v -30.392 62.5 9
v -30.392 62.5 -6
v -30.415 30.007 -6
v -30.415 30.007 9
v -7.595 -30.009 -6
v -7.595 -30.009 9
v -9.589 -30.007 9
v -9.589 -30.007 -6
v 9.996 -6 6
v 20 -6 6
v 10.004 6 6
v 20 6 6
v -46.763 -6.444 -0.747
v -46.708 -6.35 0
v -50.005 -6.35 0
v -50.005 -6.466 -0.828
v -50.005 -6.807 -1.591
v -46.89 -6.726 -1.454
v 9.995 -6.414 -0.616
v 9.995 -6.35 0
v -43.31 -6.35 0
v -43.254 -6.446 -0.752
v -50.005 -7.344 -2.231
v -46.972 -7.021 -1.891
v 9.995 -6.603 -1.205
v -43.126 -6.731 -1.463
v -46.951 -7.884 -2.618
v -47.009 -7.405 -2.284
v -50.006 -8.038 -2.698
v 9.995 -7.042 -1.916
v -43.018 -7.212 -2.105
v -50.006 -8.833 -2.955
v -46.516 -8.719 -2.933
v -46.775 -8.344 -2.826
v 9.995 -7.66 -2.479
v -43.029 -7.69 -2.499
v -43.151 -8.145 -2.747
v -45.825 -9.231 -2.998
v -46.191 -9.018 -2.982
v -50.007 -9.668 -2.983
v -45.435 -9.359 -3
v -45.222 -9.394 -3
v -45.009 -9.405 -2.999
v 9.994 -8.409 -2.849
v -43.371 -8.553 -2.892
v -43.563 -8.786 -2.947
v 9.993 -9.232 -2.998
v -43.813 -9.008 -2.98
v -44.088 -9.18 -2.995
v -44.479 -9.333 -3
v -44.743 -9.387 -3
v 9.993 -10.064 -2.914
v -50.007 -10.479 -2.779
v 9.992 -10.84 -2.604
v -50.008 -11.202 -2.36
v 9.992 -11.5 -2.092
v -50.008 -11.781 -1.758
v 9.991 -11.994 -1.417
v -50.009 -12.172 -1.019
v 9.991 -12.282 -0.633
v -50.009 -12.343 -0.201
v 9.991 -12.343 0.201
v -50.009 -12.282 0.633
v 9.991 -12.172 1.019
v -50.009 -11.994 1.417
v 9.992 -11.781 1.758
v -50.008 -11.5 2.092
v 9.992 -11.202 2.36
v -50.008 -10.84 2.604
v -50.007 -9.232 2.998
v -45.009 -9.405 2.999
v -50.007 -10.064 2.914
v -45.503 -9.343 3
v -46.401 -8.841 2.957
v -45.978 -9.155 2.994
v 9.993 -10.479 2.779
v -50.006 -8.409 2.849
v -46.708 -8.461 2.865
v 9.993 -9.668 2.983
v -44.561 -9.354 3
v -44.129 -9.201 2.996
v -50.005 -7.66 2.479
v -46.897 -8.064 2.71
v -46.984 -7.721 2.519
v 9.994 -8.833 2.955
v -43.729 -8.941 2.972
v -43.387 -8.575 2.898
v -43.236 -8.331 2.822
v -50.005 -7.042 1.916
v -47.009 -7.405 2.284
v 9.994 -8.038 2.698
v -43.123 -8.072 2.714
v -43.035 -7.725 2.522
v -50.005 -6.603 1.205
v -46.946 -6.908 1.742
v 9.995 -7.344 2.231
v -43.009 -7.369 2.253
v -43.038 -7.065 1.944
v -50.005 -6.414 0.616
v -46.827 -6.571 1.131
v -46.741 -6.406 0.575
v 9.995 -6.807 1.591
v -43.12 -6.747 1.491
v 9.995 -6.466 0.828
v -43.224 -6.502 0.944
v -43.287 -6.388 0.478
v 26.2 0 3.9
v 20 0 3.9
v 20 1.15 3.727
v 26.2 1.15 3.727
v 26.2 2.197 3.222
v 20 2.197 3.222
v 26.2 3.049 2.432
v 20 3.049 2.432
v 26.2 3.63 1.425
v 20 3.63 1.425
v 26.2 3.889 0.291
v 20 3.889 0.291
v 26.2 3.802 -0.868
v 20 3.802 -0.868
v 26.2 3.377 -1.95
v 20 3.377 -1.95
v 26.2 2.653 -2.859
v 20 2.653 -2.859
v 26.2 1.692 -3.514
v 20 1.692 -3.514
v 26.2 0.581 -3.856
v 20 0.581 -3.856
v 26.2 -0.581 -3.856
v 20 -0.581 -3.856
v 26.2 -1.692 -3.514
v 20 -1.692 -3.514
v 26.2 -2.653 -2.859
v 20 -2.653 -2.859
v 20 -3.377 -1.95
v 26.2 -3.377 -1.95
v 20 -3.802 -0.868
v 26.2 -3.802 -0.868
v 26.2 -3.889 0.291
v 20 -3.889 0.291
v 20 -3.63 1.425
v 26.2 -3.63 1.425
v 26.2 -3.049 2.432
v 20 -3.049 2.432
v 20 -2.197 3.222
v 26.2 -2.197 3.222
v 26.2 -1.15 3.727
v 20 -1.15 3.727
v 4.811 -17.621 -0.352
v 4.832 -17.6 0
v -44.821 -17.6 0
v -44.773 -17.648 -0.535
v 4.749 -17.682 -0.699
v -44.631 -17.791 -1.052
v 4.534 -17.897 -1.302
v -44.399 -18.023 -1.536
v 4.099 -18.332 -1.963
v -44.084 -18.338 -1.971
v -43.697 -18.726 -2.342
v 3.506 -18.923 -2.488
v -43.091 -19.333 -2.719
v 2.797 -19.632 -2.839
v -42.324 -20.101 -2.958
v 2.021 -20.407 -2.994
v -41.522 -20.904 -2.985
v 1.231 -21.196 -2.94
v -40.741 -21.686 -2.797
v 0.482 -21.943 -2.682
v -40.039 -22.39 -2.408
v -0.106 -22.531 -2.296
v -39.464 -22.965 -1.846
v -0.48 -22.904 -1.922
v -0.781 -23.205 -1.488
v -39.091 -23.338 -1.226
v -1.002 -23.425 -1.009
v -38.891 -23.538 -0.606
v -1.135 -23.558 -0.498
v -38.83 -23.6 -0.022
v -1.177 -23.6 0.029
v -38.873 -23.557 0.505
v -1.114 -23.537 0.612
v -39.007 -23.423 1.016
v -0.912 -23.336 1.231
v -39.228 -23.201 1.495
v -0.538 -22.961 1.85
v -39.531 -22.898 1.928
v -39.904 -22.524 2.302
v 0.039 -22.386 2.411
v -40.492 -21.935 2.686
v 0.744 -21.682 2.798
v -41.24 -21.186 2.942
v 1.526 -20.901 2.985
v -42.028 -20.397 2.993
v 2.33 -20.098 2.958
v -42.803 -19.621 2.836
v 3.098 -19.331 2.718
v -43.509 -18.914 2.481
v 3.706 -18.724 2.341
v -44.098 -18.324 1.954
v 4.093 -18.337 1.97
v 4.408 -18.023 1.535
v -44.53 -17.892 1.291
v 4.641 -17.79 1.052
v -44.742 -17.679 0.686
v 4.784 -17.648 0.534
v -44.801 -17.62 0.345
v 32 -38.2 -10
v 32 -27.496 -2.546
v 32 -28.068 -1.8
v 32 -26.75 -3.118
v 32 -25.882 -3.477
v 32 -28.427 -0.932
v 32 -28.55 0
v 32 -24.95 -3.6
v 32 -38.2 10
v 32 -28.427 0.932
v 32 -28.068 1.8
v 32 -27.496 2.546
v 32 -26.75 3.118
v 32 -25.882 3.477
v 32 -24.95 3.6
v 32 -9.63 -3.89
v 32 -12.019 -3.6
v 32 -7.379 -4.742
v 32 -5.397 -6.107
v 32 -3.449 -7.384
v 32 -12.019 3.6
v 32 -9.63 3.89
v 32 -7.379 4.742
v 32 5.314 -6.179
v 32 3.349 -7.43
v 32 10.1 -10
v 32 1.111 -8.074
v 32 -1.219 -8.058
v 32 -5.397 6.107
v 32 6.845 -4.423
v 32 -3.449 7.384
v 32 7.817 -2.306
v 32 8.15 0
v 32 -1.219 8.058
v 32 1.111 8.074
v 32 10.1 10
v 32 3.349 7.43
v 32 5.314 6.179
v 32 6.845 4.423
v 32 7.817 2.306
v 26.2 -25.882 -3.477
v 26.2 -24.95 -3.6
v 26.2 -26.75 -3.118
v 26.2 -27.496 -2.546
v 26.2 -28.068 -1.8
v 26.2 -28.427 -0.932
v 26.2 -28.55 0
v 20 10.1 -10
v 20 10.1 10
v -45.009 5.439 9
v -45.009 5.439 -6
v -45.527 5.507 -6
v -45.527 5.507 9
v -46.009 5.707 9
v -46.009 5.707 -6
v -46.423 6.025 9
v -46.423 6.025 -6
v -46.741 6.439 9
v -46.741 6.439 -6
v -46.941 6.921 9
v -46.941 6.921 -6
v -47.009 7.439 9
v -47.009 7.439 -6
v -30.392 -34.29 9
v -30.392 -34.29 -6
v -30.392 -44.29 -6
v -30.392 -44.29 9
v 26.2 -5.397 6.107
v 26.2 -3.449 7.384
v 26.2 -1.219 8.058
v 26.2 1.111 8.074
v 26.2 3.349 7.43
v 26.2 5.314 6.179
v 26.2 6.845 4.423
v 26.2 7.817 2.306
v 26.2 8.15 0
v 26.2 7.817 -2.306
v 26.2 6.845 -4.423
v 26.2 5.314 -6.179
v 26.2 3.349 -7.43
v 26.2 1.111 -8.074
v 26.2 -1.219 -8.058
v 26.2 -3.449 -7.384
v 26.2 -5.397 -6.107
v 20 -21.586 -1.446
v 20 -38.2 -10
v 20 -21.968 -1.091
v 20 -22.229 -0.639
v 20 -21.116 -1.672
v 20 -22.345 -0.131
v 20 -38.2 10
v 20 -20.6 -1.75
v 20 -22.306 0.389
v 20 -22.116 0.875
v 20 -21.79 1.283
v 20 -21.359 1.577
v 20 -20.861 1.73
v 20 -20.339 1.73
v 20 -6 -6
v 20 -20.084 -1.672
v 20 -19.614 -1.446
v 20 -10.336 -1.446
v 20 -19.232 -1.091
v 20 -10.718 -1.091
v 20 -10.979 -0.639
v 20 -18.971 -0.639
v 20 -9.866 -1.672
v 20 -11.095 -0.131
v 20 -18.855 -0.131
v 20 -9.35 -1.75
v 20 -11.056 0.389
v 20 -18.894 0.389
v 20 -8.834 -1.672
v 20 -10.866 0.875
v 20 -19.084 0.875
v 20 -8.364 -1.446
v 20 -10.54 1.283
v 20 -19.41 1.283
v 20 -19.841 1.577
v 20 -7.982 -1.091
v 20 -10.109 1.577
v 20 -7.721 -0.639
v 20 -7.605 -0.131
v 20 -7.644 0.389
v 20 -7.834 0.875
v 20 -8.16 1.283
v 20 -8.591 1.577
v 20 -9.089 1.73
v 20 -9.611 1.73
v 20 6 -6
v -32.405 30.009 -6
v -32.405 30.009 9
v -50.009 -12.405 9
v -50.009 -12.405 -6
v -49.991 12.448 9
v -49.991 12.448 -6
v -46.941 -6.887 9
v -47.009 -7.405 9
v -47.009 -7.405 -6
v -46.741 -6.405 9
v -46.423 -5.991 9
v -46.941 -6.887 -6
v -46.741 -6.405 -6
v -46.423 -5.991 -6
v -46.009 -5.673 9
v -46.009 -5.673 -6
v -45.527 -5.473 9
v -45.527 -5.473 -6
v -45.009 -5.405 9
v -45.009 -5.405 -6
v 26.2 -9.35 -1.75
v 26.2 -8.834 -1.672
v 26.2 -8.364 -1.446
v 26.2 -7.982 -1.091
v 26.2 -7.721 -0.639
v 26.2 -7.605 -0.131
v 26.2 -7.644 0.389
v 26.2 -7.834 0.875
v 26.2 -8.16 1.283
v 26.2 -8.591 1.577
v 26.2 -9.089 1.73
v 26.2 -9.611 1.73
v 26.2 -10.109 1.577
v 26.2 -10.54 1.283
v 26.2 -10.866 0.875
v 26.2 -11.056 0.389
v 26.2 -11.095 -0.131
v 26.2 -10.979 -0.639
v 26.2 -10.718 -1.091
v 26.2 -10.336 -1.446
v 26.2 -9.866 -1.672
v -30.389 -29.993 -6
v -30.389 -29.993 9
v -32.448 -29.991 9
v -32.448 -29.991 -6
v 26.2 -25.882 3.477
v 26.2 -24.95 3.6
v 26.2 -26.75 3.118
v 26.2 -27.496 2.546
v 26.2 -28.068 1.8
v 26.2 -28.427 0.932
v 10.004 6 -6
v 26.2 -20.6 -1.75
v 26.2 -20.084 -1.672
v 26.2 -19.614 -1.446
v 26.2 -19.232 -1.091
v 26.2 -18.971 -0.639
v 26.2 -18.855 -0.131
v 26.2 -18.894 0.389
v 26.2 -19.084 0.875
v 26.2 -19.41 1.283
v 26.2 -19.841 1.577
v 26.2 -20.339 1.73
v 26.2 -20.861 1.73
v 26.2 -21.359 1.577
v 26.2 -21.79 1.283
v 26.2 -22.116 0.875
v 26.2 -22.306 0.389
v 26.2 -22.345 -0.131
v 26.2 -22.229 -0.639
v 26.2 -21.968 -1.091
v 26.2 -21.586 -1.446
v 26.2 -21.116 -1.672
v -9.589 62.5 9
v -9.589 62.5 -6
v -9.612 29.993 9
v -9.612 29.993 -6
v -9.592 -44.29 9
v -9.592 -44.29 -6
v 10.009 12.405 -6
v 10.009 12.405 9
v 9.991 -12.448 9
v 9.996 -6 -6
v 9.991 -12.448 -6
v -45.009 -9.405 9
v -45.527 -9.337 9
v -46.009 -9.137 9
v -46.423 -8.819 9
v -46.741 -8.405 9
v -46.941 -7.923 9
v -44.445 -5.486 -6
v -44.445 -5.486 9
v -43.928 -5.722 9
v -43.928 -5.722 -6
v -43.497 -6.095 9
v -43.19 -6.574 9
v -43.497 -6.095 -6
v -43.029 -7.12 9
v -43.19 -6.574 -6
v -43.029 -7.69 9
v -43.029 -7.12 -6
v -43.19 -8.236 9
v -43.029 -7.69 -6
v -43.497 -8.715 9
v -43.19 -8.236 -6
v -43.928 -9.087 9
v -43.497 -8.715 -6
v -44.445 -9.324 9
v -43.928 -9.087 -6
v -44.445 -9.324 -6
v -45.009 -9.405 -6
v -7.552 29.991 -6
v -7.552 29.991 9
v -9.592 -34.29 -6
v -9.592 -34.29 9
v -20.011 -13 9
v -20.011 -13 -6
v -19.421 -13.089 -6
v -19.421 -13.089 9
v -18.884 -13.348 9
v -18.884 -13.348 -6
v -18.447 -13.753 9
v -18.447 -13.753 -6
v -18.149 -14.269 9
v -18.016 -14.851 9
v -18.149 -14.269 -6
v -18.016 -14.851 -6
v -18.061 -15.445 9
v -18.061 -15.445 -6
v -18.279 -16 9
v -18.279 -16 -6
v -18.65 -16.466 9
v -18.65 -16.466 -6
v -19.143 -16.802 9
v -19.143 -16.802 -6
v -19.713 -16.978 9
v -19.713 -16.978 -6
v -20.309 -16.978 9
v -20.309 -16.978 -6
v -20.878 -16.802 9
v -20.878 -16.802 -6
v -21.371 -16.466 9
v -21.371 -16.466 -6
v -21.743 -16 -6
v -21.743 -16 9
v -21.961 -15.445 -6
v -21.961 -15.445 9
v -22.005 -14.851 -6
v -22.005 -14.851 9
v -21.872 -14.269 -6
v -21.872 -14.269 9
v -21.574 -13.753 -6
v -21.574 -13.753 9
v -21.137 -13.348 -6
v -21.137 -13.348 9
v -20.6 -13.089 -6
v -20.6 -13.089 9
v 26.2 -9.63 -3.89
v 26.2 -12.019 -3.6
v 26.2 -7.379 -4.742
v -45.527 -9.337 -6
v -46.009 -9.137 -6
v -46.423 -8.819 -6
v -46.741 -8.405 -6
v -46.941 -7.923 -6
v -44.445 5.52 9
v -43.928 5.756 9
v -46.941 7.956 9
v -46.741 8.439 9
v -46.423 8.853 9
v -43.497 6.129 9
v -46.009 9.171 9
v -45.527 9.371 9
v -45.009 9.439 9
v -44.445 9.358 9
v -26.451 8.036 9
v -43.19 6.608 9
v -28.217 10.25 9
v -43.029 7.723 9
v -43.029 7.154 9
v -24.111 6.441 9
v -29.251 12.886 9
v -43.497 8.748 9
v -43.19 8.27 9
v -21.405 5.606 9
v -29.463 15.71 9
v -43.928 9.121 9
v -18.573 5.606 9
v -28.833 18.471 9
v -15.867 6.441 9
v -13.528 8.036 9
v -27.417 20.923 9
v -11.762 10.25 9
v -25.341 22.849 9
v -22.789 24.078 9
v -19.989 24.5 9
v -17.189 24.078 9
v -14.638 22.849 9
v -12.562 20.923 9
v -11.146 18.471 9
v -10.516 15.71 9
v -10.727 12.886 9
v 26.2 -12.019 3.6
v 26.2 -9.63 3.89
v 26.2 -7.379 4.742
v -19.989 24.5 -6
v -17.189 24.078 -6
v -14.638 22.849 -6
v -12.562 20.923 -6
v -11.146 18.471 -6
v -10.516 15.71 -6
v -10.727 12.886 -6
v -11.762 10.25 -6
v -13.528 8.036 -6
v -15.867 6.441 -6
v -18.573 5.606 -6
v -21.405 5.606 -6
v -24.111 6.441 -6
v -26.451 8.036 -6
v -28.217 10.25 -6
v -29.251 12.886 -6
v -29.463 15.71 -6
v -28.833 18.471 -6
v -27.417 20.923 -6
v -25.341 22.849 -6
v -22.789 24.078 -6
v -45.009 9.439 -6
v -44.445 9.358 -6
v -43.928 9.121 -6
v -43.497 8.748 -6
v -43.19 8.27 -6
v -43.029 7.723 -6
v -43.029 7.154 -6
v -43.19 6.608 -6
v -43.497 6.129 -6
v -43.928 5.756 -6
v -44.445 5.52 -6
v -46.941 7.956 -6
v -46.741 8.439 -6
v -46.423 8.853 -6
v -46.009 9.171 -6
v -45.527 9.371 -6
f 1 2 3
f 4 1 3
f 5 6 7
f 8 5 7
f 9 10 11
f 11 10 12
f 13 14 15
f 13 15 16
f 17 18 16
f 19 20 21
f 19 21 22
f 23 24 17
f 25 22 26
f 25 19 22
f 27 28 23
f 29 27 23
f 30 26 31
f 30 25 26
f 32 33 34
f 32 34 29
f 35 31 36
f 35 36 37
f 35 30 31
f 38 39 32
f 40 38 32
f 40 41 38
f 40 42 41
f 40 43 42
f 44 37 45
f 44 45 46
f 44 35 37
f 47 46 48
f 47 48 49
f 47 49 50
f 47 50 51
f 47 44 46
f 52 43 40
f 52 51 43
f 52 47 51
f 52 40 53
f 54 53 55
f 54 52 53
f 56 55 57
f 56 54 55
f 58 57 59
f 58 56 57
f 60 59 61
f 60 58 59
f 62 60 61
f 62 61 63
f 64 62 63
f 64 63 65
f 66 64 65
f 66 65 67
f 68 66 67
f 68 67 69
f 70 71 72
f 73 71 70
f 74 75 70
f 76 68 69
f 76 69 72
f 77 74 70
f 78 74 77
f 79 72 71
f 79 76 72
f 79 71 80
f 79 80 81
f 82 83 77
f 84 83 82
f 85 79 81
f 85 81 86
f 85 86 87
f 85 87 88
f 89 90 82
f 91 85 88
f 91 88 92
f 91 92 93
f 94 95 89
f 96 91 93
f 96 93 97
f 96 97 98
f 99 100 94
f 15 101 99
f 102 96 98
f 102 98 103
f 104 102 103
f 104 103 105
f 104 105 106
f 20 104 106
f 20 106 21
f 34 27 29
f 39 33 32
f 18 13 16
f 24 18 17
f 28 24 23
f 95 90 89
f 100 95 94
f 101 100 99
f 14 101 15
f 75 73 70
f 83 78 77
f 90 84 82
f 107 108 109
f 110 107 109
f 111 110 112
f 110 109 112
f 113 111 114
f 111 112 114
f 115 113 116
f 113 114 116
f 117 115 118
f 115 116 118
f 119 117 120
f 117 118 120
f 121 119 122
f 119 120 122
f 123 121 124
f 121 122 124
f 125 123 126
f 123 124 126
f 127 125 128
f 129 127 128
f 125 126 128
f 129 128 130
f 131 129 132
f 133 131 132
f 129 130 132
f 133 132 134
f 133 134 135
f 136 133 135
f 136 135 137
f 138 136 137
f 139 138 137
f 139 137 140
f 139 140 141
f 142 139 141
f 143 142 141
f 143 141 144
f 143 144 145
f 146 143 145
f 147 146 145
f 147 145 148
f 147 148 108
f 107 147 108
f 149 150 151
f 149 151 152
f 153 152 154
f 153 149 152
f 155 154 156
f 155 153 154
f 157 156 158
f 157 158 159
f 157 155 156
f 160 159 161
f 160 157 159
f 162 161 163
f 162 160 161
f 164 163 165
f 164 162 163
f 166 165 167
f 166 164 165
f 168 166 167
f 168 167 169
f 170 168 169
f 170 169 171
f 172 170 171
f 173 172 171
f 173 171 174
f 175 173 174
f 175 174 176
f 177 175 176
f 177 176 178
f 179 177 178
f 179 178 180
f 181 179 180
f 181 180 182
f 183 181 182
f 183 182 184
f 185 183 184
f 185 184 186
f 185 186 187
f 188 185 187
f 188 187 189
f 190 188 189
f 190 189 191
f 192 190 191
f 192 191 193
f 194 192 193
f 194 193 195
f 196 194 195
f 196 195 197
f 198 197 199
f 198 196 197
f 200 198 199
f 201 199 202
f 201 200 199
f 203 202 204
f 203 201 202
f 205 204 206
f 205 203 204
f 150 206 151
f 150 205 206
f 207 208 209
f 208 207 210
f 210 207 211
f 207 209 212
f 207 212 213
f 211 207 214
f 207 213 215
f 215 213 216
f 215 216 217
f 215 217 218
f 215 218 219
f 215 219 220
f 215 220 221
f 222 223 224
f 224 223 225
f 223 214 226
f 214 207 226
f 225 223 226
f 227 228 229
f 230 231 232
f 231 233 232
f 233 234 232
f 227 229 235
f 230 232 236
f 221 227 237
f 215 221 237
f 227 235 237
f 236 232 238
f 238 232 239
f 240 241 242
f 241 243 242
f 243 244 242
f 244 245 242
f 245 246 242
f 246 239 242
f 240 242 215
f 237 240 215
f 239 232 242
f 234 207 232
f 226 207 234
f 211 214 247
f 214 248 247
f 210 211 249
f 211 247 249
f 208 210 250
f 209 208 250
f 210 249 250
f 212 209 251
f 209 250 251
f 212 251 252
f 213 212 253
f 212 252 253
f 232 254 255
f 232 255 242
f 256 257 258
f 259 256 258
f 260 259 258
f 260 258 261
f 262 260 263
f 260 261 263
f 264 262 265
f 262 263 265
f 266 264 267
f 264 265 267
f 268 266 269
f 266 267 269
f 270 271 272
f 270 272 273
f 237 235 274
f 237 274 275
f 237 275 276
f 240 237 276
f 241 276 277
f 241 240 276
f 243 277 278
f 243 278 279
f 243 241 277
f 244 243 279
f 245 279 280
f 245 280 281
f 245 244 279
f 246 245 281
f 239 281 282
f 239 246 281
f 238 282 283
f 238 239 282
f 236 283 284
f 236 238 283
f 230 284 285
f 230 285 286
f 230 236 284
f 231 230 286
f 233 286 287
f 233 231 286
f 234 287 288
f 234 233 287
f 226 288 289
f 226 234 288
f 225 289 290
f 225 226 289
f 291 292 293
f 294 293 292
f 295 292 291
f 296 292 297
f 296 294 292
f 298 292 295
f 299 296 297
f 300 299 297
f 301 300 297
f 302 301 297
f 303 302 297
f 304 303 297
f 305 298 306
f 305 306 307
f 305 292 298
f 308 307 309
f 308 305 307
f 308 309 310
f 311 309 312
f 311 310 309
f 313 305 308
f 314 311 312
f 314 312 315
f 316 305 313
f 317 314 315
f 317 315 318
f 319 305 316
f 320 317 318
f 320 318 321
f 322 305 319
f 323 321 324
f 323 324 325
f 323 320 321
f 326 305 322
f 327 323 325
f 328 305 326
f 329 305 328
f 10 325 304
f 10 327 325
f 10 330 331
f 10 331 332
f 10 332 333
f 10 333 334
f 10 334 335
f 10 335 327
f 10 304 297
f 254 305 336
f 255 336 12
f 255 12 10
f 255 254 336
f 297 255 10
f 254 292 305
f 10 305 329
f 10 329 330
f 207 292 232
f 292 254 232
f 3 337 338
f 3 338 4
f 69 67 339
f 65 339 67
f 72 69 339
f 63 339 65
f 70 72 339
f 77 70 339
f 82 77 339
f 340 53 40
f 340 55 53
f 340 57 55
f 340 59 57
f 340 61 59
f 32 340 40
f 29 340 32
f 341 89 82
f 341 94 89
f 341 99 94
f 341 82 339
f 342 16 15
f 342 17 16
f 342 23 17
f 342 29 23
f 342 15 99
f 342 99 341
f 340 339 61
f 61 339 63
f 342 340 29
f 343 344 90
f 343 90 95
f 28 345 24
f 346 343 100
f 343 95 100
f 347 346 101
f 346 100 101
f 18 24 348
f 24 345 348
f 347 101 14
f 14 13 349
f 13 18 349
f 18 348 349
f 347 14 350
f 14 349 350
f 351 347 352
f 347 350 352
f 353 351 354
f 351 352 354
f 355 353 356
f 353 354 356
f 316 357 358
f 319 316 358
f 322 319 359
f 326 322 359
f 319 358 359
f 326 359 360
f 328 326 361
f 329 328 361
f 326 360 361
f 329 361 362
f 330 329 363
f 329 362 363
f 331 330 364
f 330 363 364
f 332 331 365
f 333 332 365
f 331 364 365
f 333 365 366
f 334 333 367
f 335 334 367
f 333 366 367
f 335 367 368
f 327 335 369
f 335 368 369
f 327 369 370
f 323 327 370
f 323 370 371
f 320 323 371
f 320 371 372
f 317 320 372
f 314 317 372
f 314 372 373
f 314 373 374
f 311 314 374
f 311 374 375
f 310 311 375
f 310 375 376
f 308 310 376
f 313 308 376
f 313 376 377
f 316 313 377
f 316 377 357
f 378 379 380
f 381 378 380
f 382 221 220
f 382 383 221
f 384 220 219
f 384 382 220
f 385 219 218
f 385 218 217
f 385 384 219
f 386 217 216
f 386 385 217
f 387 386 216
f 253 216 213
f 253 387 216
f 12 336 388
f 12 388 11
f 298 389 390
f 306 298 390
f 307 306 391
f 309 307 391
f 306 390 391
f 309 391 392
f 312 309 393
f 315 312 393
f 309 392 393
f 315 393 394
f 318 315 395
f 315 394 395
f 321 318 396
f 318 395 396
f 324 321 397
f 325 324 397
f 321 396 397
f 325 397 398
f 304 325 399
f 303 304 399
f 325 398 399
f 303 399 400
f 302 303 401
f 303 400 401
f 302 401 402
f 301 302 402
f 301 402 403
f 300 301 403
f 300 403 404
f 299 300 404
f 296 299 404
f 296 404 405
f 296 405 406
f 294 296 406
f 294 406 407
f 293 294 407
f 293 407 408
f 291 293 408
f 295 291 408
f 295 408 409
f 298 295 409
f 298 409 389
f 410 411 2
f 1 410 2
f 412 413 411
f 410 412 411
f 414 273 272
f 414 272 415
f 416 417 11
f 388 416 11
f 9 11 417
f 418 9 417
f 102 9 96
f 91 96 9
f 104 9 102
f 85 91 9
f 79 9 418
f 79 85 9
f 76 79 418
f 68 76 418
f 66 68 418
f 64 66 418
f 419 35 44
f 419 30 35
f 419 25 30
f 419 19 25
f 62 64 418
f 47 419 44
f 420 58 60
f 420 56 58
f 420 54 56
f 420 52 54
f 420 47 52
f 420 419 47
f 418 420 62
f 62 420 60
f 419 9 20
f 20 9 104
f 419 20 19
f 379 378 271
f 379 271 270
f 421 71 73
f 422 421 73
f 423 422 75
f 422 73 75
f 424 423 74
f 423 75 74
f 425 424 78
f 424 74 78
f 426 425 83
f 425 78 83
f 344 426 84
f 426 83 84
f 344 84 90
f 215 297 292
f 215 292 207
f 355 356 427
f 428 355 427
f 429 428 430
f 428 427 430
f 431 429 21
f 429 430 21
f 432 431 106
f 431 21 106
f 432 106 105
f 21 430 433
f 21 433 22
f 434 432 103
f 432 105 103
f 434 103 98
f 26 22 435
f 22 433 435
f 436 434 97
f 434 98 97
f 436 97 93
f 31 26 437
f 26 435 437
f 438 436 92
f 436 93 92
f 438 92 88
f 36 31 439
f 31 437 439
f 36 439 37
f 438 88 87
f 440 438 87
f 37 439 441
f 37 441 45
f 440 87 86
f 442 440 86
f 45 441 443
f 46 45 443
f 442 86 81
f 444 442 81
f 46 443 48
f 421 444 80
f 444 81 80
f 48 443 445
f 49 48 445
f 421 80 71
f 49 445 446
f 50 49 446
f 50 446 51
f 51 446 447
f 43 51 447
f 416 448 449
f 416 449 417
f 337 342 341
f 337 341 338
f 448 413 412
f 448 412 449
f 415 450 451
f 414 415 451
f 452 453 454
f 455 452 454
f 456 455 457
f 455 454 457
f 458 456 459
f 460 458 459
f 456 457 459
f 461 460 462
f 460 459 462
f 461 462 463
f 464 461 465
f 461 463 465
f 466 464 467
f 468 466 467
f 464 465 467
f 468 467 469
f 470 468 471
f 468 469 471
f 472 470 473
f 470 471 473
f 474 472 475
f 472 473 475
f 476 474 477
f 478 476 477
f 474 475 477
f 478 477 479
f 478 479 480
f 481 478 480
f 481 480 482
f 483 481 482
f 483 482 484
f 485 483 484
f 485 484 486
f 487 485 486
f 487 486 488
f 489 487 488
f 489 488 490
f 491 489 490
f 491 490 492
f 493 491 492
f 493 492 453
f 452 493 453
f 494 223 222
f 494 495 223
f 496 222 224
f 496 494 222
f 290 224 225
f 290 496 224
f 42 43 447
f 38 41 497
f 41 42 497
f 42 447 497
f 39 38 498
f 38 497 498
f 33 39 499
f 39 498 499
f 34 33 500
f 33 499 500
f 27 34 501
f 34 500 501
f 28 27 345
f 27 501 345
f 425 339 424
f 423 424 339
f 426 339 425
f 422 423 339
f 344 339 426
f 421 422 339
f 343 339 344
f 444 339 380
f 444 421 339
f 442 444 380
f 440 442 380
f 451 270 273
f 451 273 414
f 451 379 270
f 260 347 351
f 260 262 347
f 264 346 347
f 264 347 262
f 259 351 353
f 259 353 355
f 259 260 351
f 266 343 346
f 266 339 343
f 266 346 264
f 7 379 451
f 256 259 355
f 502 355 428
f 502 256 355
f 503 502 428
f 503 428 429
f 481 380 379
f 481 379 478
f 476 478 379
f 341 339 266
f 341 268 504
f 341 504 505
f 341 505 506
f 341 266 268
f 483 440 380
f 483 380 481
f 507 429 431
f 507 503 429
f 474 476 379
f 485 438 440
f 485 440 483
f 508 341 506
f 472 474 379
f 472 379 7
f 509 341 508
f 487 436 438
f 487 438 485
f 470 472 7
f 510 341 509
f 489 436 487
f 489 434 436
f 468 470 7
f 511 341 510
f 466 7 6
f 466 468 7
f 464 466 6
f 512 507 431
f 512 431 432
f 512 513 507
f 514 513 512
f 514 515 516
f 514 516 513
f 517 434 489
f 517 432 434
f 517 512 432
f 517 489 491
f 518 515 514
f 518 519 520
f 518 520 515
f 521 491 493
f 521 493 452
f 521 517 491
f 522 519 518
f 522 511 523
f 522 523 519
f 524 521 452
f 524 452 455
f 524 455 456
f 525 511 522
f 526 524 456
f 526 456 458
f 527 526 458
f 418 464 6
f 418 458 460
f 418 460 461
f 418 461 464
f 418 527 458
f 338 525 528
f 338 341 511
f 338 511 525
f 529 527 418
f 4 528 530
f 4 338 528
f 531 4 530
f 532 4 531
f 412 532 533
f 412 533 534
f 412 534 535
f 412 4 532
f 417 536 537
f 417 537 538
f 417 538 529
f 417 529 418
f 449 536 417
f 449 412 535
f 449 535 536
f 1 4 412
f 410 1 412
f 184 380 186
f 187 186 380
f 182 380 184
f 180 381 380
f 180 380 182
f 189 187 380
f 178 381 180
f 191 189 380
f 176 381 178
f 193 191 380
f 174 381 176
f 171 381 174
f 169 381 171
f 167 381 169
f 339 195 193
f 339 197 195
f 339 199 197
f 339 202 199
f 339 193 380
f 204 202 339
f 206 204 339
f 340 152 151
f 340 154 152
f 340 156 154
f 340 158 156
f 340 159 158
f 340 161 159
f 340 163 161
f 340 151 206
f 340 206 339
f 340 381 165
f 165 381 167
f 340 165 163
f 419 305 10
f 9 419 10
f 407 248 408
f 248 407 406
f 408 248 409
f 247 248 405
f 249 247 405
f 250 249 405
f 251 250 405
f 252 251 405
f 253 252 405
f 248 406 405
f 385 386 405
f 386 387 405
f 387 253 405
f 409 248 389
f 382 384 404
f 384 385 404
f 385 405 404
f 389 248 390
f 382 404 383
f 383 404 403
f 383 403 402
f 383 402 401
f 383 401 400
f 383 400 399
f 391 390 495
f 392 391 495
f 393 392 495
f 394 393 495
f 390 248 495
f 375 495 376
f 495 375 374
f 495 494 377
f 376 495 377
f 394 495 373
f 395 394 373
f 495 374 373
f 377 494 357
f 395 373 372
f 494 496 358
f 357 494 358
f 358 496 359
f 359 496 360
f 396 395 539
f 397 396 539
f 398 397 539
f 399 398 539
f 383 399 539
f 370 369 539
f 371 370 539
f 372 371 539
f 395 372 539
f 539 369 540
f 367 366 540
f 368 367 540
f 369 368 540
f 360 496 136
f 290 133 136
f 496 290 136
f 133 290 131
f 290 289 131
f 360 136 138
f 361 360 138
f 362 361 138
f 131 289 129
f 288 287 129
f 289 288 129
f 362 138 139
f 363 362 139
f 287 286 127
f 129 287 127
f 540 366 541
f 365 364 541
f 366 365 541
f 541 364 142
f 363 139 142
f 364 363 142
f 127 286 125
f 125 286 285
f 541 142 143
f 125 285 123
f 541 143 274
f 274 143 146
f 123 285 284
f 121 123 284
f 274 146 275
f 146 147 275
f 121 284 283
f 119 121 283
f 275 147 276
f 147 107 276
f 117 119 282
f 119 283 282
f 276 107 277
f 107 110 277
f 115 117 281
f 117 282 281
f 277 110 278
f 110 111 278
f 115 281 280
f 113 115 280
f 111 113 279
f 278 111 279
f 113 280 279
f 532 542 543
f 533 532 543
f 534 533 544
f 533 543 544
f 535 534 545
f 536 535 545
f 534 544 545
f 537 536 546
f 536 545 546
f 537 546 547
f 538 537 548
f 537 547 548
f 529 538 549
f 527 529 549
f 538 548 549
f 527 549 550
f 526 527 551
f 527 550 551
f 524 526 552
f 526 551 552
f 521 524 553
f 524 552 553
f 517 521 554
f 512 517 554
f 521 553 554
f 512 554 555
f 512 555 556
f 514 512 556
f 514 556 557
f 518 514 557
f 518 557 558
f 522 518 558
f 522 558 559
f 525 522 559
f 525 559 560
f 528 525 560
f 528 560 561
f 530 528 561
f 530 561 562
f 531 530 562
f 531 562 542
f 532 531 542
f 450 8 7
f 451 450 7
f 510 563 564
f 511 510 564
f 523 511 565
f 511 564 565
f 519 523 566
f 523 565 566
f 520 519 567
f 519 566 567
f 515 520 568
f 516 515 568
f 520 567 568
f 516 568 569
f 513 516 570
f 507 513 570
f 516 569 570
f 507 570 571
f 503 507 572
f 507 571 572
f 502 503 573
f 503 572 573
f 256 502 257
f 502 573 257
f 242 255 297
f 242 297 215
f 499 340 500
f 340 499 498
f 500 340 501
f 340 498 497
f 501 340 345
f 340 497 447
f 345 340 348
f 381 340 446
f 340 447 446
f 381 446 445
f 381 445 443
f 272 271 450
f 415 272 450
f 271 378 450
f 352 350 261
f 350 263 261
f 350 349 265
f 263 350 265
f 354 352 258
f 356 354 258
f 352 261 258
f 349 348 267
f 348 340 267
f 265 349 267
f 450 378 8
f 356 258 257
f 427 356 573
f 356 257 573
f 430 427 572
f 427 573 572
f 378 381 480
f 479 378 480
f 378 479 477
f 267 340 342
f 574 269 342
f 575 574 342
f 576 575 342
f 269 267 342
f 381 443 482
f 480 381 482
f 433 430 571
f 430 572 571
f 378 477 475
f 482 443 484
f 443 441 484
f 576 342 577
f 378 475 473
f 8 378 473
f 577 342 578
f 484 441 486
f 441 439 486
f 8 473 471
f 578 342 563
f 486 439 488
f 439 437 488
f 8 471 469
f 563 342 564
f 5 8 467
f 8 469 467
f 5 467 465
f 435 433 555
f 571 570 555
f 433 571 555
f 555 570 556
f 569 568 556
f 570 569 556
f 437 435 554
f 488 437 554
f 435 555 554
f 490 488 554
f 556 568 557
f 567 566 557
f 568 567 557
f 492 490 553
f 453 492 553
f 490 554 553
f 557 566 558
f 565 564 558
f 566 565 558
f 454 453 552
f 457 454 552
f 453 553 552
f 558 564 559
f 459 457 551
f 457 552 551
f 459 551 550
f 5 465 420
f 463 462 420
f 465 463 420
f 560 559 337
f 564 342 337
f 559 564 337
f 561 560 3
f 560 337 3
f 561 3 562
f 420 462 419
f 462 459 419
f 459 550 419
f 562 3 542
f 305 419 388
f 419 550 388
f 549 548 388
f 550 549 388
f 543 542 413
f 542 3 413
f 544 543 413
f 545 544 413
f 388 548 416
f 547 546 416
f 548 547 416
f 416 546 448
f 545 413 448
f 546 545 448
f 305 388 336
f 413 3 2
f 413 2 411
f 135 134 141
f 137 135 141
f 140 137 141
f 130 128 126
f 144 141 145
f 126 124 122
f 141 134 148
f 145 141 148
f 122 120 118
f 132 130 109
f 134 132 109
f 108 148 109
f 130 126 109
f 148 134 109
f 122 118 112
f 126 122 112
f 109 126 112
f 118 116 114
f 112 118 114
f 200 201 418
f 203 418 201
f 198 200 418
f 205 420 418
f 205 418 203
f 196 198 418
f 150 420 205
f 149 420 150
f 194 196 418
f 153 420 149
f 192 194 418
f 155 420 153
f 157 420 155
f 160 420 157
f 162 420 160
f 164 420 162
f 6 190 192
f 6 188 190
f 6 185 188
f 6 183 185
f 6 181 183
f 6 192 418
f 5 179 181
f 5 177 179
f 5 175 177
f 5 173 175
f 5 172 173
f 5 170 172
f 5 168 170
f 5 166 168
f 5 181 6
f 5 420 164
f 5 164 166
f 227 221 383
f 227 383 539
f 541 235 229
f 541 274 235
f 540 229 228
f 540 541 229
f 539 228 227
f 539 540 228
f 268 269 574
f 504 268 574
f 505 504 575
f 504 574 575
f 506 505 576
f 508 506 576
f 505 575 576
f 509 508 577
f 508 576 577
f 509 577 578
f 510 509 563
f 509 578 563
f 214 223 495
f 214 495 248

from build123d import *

# Parameters (mm, degrees)
SKETCH1_W            = 20
SKETCH1_H            = 20
BOSS_EXTRUDE1_DEPTH  = 20
SKETCH2_W            = 45
SKETCH2_H            = 70
BOSS_EXTRUDE2_DEPTH  = 12
CUT_EXTRUDE1_DEPTH   = 5.8
FILLET1_R            = 3.6
FILLET2_R            = 10
SKETCH5_R            = 3.9
CUT_EXTRUDE2_DEPTH   = 53.490475326
CUT_EXTRUDE3_REACH   = 51.17
SKETCH6_R            = 1.75
SKETCH7_W            = 12
SKETCH7_H            = 45
CUT_EXTRUDE4_DEPTH   = 4.8
SKETCH9_W            = 12
SKETCH9_H            = 45
CUT_EXTRUDE5_DEPTH   = 23.8
SKETCH10_W           = 12.5
SKETCH10_H           = 41.4
CUT_EXTRUDE6_DEPTH   = 23.8
SKETCH11_W           = 20
SKETCH11_H           = 1.2
CUT_EXTRUDE7_DEPTH   = 23.8
BOSS_EXTRUDE3_START  = 20
SKETCH12_W           = 20
SKETCH12_H           = 20
SKETCH12_R           = 3.9
BOSS_EXTRUDE3_DEPTH  = 20
SKETCH13_W           = 20.2
SKETCH13_H           = 20.2
SKETCH13_R           = 3.9
BOSS_EXTRUDE4_DEPTH  = 40
SKETCH14_W           = 12
SKETCH14_H           = 20
BOSS_EXTRUDE5_DEPTH  = 0.1
SKETCH17_R           = 4.83091966
BOSS_EXTRUDE8_DEPTH  = 39
SKETCH18_W           = 20.2
SKETCH18_H           = 20.2
CUT_EXTRUDE8_DEPTH   = 40
SKETCH20_W           = 12
SKETCH20_H           = 20
BOSS_EXTRUDE9_DEPTH  = 8
SKETCH21_W           = 12
SKETCH21_H           = 12
BOSS_EXTRUDE10_DEPTH = 40
BOSS_EXTRUDE11_DEPTH = 15
SKETCH27_R           = 2
SKETCH27_R_2         = 9.5
CUT_EXTRUDE10_DEPTH  = 65.931708229
BOSS_EXTRUDE12_DEPTH = 38.2
BOSS_EXTRUDE13_REACH = 117.263
SKETCH29_W           = 20.800005304
SKETCH29_H           = 15
BOSS_EXTRUDE14_START = -6
BOSS_EXTRUDE14_DEPTH = 15
SKETCH33_W           = 20.8
SKETCH33_H           = 10
BOSS_EXTRUDE15_DEPTH = 8.09
SKETCH34_W           = 20.8
SKETCH34_H           = 10
BOSS_EXTRUDE16_DEPTH = 27.8
SKETCH35_W           = 20.8
SKETCH35_H           = 96.79
CUT_EXTRUDE11_DEPTH  = 38.2
SKETCH36_W           = 20.800010608
SKETCH36_H           = 15
BOSS_EXTRUDE17_DEPTH = 10
CUT_EXTRUDE12_DEPTH  = 82.628035964
SKETCH39_R           = 3
CUT_EXTRUDE13_DEPTH  = 80


# Read off the part's stored shape, not the designer's step: Boss-Extrude14
with BuildPart() as part:
    # Sketch1 → Boss-Extrude1 (new body)
    with BuildSketch(Plane(origin=(0, 0, 0), x_dir=(0, 0, -1), z_dir=(1, 0, 0))):
        Rectangle(SKETCH1_W, SKETCH1_H)
    extrude(amount=BOSS_EXTRUDE1_DEPTH)

    # Sketch2 → Boss-Extrude2 (add)
    with BuildSketch(Plane(origin=(20, 0, 0), x_dir=(0, 0, -1), z_dir=(1, 0, 0))):
        Rectangle(SKETCH2_W, SKETCH2_H)
    extrude(amount=BOSS_EXTRUDE2_DEPTH)

    # Sketch4 → Cut-Extrude1 (cut)
    with BuildSketch(Plane(origin=(32, 0, 0), x_dir=(0, 0, -1), z_dir=(1, 0, 0))):
        with BuildLine():
            Line((3.6, -28.55), (-3.6, -28.55))
            Line((-3.6, -28.55), (-3.6, -7.311805523))
            ThreePointArc((-3.6, -7.311805523), (0, 8.15), (3.6, -7.311805523))
            Line((3.6, -7.311805523), (3.6, -28.55))
        make_face()
    extrude(amount=-CUT_EXTRUDE1_DEPTH, mode=Mode.SUBTRACT)

    # Fillet1
    fillet1_edges = [part.edges().sort_by_distance(p)[0] for p in [
        (29.1, -28.55, 3.6),
        (29.1, -28.55, -3.6),
    ]]
    fillet(fillet1_edges, radius=FILLET1_R - 0.0001)  # a hair under: the kernel refuses the full size

    # Fillet2
    fillet2_edges = [part.edges().sort_by_distance(p)[0] for p in [
        (29.1, -7.311805523, 3.6),
        (29.1, -7.311805523, -3.6),
    ]]
    fillet(fillet2_edges, radius=FILLET2_R)

    # Sketch5 → Cut-Extrude2 (cut, through all)
    with BuildSketch(Plane.ZY):
        Circle(SKETCH5_R)
    extrude(amount=-CUT_EXTRUDE2_DEPTH, mode=Mode.SUBTRACT)

    # Sketch6 → Cut-Extrude3 (cut, up to next)
    with BuildSketch(Plane(origin=(26.2, 0, 0), x_dir=(0, 0, -1), z_dir=(1, 0, 0)), mode=Mode.PRIVATE) as cut_extrude3_sk1:
        with Locations((0, -20.6)):
            Circle(SKETCH6_R)
    cut_extrude3_tool1 = extrude(cut_extrude3_sk1.sketch, amount=-CUT_EXTRUDE3_REACH, mode=Mode.PRIVATE) & part.part
    # Sketch6 → Cut-Extrude3 (cut, up to next)
    with BuildSketch(Plane(origin=(26.2, 0, 0), x_dir=(0, 0, -1), z_dir=(1, 0, 0)), mode=Mode.PRIVATE) as cut_extrude3_sk2:
        with Locations((0, -9.35)):
            Circle(SKETCH6_R)
    cut_extrude3_tool2 = extrude(cut_extrude3_sk2.sketch, amount=-CUT_EXTRUDE3_REACH, mode=Mode.PRIVATE) & part.part
    add(cut_extrude3_tool1.solids().sort_by_distance((26.2, -20.6, 0))[0], mode=Mode.SUBTRACT)
    add(cut_extrude3_tool2.solids().sort_by_distance((26.2, -9.35, 0))[0], mode=Mode.SUBTRACT)

    # Sketch7 → Cut-Extrude4 (cut)
    with BuildSketch(Plane.XZ.offset(35)):
        with Locations((26, 0)):
            Rectangle(SKETCH7_W, SKETCH7_H)
    extrude(amount=-CUT_EXTRUDE4_DEPTH, mode=Mode.SUBTRACT)

    # Sketch9 → Cut-Extrude5 (cut)
    with BuildSketch(Plane(origin=(0, 35, 0), x_dir=(1, 0, 0), z_dir=(0, 1, 0))):
        with Locations((26, 0)):
            Rectangle(SKETCH9_W, SKETCH9_H)
    extrude(amount=-CUT_EXTRUDE5_DEPTH, mode=Mode.SUBTRACT)

    # Sketch10 → Cut-Extrude6 (cut)
    with BuildSketch(Plane.ZY.offset(-20)):
        with Locations((-16.25, -9.5)):
            Rectangle(SKETCH10_W, SKETCH10_H)
        with Locations((16.25, -9.5)):
            Rectangle(SKETCH10_W, SKETCH10_H)
    extrude(amount=-CUT_EXTRUDE6_DEPTH, mode=Mode.SUBTRACT)

    # Sketch11 → Cut-Extrude7 (cut)
    with BuildSketch(Plane.ZY.offset(-20)):
        with Locations((0, 10.6)):
            Rectangle(SKETCH11_W, SKETCH11_H)
    extrude(amount=-CUT_EXTRUDE7_DEPTH, mode=Mode.SUBTRACT)

    # Sketch12 → Boss-Extrude3 (add)
    with BuildSketch(Plane.ZY.offset(BOSS_EXTRUDE3_START)):
        Rectangle(SKETCH12_W, SKETCH12_H)
        Circle(SKETCH12_R, mode=Mode.SUBTRACT)
    extrude(amount=-BOSS_EXTRUDE3_DEPTH)

    # Sketch13 → Boss-Extrude4 (add)
    with BuildSketch(Plane.ZY.offset(20)):
        Rectangle(SKETCH13_W, SKETCH13_H)
        Circle(SKETCH13_R, mode=Mode.SUBTRACT)
    extrude(amount=-BOSS_EXTRUDE4_DEPTH)

    # Sketch14 → Boss-Extrude5 (add)
    with BuildSketch(Plane(origin=(0, 10, 0), x_dir=(1, 0, 0), z_dir=(0, 1, 0))):
        with Locations((26, 0)):
            Rectangle(SKETCH14_W, SKETCH14_H)
    extrude(amount=BOSS_EXTRUDE5_DEPTH)

    # Sketch17 → Boss-Extrude8 (add)
    with BuildSketch(Plane.ZY.offset(20)):
        Circle(SKETCH17_R)
    extrude(amount=-BOSS_EXTRUDE8_DEPTH)

    # Sketch18 → Cut-Extrude8 (cut)
    with BuildSketch(Plane.ZY.offset(20)):
        Rectangle(SKETCH18_W, SKETCH18_H)
    extrude(amount=-CUT_EXTRUDE8_DEPTH, mode=Mode.SUBTRACT)

    # Sketch20 → Boss-Extrude9 (add)
    with BuildSketch(Plane.XZ.offset(30.2)):
        with Locations((26, 0)):
            Rectangle(SKETCH20_W, SKETCH20_H)
    extrude(amount=BOSS_EXTRUDE9_DEPTH)

    # Sketch21 → Boss-Extrude10 (add)
    with BuildSketch(Plane.ZY.offset(-20)):
        Rectangle(SKETCH21_W, SKETCH21_H)
    extrude(amount=BOSS_EXTRUDE10_DEPTH)

    # Sketch22 → Boss-Extrude11 (add)
    with BuildSketch(Plane(origin=(0, 0, -6), x_dir=(-1, 0, 0), z_dir=(0, 0, -1))):
        Polygon((49.991118151, 12.447827913), (32.404979492, 30.008866549), (7.552172087, 29.991118151), (-10.008866549, 12.404979492), (-9.991118151, -12.447827913), (7.595020508, -30.008866549), (32.447827913, -29.991118151), (50.008866549, -12.404979492), align=None)
    extrude(amount=-BOSS_EXTRUDE11_DEPTH)

    # Sketch27 → Cut-Extrude10 (cut, through all)
    with BuildSketch(Plane(origin=(0, 0, -6), x_dir=(-1, 0, 0), z_dir=(0, 0, -1))):
        with Locations(Location((20.010712105, -14.999996175, 0), (0, 0, 90))):
            Circle(SKETCH27_R)
        with Locations(Location((19.989287895, 14.999996175, 0), (0, 0, 90))):
            Circle(SKETCH27_R_2)
    extrude(amount=-CUT_EXTRUDE10_DEPTH, mode=Mode.SUBTRACT)

    # Sketch26 → Boss-Extrude12 (add)
    with BuildSketch(Plane.XY.offset(9)):
        Polygon((-30.389287895, 52.499996175), (-19.989287895, 52.499996175), (-9.589287895, 52.499996175), (-9.589287895, 62.499996175), (-30.389287895, 62.499996175), align=None)
        Polygon((-9.589287895, -30.007442362), (-30.389287895, -29.992588238), (-30.389287895, -34.290003825), (-9.589287895, -34.290003825), align=None)
        Polygon((-9.589287895, -24.290003825), (-30.389287895, -24.290003825), (-30.389287895, -29.992588238), (-9.589287895, -30.007442362), align=None)
    extrude(amount=BOSS_EXTRUDE12_DEPTH)


with BuildPart() as boss_extrude12_piece_1:
    # of the separate pieces the step leaves, piece 1, a body of its own (boss_extrude12_pieces)
    add(part.part.solids().sort_by_distance((32, -38.2, -10))[0])

    # Boss-Extrude13: up to this plane
    boss_extrude13_end = Plane(origin=(0, -34.290003825, 47.2), z_dir=(0, 1, 0))
    # Sketch29 → Boss-Extrude13 (add, up to the surface)
    with BuildSketch(Plane(origin=(-0.021434411, -30.014275154, 0), x_dir=(0.999999745001739, -0.0007141403622172189, 0), z_dir=(-0.0007141403622172189, -0.999999745001739, 0)), mode=Mode.PRIVATE) as boss_extrude13_sk1:
        with Locations((-19.967858576, 1.5)):
            Rectangle(SKETCH29_W, SKETCH29_H)
    boss_extrude13_tool1 = split(extrude(boss_extrude13_sk1.sketch, amount=BOSS_EXTRUDE13_REACH, mode=Mode.PRIVATE), bisect_by=boss_extrude13_end, keep=Keep.BOTH, mode=Mode.PRIVATE)
    add(boss_extrude13_tool1.solids().sort_by_distance((-19.989288, -30.000015, 1.5))[0])



with BuildPart() as boss_extrude12_piece_2:
    # of the separate pieces the step leaves, piece 2, a body of its own (boss_extrude12_pieces)
    add(part.part.solids().sort_by_distance((-9.589287895, 62.499996175, 9))[0])


with BuildPart() as boss_extrude12_piece_1_1:
    add(boss_extrude12_piece_1.part)

    add(boss_extrude12_piece_2.part)  # Boss-Extrude14 merges Boss-Extrude12 piece 2
    # Boss-Extrude14 outline → Boss-Extrude14 (add)
    with BuildSketch(Plane.XY.offset(BOSS_EXTRUDE14_START)):
        Polygon((-9.612171561, 29.99258928), (-9.588956704, 62.499996175), (-30.391775751, 62.499996175), (-30.414979999, 30.007445409), align=None)
    extrude(amount=BOSS_EXTRUDE14_DEPTH)

    # Sketch33 → Boss-Extrude15 (add)
    with BuildSketch(Plane(origin=(0, -24.290003825, 0), x_dir=(1, 0, 0), z_dir=(0, 1, 0))):
        with Locations((-19.989287895, -42.2)):
            Rectangle(SKETCH33_W, SKETCH33_H)
    extrude(amount=BOSS_EXTRUDE15_DEPTH)

    # Sketch34 → Boss-Extrude16 (add)
    with BuildSketch(Plane.XZ.offset(-52.499996175)):
        with Locations((-19.989287895, 42.2)):
            Rectangle(SKETCH34_W, SKETCH34_H)
    extrude(amount=BOSS_EXTRUDE16_DEPTH)

    # Sketch35 → Cut-Extrude11 (cut)
    with BuildSketch(Plane.XY.offset(47.2)):
        with Locations((-19.989287895, 14.104996175)):
            Rectangle(SKETCH35_W, SKETCH35_H)
    extrude(amount=-CUT_EXTRUDE11_DEPTH, mode=Mode.SUBTRACT)

    # Sketch36 → Boss-Extrude17 (add)
    with BuildSketch(Plane.XZ.offset(34.290003825)):
        with Locations((-19.992351549, 1.5)):
            Rectangle(SKETCH36_W, SKETCH36_H)
    extrude(amount=BOSS_EXTRUDE17_DEPTH)

    # Sketch38 → Cut-Extrude12 (cut, through all)
    with BuildSketch(Plane(origin=(0, 0, -6), x_dir=(-1, 0, 0), z_dir=(0, 0, -1))):
        with BuildLine():
            ThreePointArc((45.008866549, -5.404979492), (43.008866549, -7.404979492), (45.008866549, -9.404979492))
            Line((45.008866549, -9.404979492), (45.008866549, -7.404979492))
            Line((45.008866549, -7.404979492), (45.008866549, -5.404979492))
        make_face()
        with BuildLine():
            Line((45.008866549, -7.404979492), (45.008866549, -9.404979492))
            ThreePointArc((45.008866549, -9.404979492), (46.423080111, -8.819193054), (47.008866549, -7.404979492))
            ThreePointArc((47.008866549, -7.404979492), (46.423080111, -5.990765929), (45.008866549, -5.404979492))
            Line((45.008866549, -5.404979492), (45.008866549, -7.404979492))
        make_face()
        with BuildLine():
            ThreePointArc((45.008866549, 9.438738179), (43.008866549, 7.438738179), (45.008866549, 5.438738179))
            Line((45.008866549, 5.438738179), (45.008866549, 7.438738179))
            Line((45.008866549, 7.438738179), (45.008866549, 9.438738179))
        make_face()
        with BuildLine():
            Line((45.008866549, 7.438738179), (45.008866549, 5.438738179))
            ThreePointArc((45.008866549, 5.438738179), (46.423080111, 6.024524616), (47.008866549, 7.438738179))
            ThreePointArc((47.008866549, 7.438738179), (46.423080111, 8.852951741), (45.008866549, 9.438738179))
            Line((45.008866549, 9.438738179), (45.008866549, 7.438738179))
        make_face()
    extrude(amount=-CUT_EXTRUDE12_DEPTH, mode=Mode.SUBTRACT)

    # Sketch39 → Cut-Extrude13 (cut)
    with BuildSketch(Plane.ZY.offset(-20)):
        with Locations(Location((0, -20.6, 0), (0, 0, 90))):
            Circle(SKETCH39_R)
        with Locations(Location((0, -9.35, 0), (0, 0, 90))):
            Circle(SKETCH39_R)
    extrude(amount=CUT_EXTRUDE13_DEPTH, mode=Mode.SUBTRACT)


solid = boss_extrude12_piece_1_1.part
